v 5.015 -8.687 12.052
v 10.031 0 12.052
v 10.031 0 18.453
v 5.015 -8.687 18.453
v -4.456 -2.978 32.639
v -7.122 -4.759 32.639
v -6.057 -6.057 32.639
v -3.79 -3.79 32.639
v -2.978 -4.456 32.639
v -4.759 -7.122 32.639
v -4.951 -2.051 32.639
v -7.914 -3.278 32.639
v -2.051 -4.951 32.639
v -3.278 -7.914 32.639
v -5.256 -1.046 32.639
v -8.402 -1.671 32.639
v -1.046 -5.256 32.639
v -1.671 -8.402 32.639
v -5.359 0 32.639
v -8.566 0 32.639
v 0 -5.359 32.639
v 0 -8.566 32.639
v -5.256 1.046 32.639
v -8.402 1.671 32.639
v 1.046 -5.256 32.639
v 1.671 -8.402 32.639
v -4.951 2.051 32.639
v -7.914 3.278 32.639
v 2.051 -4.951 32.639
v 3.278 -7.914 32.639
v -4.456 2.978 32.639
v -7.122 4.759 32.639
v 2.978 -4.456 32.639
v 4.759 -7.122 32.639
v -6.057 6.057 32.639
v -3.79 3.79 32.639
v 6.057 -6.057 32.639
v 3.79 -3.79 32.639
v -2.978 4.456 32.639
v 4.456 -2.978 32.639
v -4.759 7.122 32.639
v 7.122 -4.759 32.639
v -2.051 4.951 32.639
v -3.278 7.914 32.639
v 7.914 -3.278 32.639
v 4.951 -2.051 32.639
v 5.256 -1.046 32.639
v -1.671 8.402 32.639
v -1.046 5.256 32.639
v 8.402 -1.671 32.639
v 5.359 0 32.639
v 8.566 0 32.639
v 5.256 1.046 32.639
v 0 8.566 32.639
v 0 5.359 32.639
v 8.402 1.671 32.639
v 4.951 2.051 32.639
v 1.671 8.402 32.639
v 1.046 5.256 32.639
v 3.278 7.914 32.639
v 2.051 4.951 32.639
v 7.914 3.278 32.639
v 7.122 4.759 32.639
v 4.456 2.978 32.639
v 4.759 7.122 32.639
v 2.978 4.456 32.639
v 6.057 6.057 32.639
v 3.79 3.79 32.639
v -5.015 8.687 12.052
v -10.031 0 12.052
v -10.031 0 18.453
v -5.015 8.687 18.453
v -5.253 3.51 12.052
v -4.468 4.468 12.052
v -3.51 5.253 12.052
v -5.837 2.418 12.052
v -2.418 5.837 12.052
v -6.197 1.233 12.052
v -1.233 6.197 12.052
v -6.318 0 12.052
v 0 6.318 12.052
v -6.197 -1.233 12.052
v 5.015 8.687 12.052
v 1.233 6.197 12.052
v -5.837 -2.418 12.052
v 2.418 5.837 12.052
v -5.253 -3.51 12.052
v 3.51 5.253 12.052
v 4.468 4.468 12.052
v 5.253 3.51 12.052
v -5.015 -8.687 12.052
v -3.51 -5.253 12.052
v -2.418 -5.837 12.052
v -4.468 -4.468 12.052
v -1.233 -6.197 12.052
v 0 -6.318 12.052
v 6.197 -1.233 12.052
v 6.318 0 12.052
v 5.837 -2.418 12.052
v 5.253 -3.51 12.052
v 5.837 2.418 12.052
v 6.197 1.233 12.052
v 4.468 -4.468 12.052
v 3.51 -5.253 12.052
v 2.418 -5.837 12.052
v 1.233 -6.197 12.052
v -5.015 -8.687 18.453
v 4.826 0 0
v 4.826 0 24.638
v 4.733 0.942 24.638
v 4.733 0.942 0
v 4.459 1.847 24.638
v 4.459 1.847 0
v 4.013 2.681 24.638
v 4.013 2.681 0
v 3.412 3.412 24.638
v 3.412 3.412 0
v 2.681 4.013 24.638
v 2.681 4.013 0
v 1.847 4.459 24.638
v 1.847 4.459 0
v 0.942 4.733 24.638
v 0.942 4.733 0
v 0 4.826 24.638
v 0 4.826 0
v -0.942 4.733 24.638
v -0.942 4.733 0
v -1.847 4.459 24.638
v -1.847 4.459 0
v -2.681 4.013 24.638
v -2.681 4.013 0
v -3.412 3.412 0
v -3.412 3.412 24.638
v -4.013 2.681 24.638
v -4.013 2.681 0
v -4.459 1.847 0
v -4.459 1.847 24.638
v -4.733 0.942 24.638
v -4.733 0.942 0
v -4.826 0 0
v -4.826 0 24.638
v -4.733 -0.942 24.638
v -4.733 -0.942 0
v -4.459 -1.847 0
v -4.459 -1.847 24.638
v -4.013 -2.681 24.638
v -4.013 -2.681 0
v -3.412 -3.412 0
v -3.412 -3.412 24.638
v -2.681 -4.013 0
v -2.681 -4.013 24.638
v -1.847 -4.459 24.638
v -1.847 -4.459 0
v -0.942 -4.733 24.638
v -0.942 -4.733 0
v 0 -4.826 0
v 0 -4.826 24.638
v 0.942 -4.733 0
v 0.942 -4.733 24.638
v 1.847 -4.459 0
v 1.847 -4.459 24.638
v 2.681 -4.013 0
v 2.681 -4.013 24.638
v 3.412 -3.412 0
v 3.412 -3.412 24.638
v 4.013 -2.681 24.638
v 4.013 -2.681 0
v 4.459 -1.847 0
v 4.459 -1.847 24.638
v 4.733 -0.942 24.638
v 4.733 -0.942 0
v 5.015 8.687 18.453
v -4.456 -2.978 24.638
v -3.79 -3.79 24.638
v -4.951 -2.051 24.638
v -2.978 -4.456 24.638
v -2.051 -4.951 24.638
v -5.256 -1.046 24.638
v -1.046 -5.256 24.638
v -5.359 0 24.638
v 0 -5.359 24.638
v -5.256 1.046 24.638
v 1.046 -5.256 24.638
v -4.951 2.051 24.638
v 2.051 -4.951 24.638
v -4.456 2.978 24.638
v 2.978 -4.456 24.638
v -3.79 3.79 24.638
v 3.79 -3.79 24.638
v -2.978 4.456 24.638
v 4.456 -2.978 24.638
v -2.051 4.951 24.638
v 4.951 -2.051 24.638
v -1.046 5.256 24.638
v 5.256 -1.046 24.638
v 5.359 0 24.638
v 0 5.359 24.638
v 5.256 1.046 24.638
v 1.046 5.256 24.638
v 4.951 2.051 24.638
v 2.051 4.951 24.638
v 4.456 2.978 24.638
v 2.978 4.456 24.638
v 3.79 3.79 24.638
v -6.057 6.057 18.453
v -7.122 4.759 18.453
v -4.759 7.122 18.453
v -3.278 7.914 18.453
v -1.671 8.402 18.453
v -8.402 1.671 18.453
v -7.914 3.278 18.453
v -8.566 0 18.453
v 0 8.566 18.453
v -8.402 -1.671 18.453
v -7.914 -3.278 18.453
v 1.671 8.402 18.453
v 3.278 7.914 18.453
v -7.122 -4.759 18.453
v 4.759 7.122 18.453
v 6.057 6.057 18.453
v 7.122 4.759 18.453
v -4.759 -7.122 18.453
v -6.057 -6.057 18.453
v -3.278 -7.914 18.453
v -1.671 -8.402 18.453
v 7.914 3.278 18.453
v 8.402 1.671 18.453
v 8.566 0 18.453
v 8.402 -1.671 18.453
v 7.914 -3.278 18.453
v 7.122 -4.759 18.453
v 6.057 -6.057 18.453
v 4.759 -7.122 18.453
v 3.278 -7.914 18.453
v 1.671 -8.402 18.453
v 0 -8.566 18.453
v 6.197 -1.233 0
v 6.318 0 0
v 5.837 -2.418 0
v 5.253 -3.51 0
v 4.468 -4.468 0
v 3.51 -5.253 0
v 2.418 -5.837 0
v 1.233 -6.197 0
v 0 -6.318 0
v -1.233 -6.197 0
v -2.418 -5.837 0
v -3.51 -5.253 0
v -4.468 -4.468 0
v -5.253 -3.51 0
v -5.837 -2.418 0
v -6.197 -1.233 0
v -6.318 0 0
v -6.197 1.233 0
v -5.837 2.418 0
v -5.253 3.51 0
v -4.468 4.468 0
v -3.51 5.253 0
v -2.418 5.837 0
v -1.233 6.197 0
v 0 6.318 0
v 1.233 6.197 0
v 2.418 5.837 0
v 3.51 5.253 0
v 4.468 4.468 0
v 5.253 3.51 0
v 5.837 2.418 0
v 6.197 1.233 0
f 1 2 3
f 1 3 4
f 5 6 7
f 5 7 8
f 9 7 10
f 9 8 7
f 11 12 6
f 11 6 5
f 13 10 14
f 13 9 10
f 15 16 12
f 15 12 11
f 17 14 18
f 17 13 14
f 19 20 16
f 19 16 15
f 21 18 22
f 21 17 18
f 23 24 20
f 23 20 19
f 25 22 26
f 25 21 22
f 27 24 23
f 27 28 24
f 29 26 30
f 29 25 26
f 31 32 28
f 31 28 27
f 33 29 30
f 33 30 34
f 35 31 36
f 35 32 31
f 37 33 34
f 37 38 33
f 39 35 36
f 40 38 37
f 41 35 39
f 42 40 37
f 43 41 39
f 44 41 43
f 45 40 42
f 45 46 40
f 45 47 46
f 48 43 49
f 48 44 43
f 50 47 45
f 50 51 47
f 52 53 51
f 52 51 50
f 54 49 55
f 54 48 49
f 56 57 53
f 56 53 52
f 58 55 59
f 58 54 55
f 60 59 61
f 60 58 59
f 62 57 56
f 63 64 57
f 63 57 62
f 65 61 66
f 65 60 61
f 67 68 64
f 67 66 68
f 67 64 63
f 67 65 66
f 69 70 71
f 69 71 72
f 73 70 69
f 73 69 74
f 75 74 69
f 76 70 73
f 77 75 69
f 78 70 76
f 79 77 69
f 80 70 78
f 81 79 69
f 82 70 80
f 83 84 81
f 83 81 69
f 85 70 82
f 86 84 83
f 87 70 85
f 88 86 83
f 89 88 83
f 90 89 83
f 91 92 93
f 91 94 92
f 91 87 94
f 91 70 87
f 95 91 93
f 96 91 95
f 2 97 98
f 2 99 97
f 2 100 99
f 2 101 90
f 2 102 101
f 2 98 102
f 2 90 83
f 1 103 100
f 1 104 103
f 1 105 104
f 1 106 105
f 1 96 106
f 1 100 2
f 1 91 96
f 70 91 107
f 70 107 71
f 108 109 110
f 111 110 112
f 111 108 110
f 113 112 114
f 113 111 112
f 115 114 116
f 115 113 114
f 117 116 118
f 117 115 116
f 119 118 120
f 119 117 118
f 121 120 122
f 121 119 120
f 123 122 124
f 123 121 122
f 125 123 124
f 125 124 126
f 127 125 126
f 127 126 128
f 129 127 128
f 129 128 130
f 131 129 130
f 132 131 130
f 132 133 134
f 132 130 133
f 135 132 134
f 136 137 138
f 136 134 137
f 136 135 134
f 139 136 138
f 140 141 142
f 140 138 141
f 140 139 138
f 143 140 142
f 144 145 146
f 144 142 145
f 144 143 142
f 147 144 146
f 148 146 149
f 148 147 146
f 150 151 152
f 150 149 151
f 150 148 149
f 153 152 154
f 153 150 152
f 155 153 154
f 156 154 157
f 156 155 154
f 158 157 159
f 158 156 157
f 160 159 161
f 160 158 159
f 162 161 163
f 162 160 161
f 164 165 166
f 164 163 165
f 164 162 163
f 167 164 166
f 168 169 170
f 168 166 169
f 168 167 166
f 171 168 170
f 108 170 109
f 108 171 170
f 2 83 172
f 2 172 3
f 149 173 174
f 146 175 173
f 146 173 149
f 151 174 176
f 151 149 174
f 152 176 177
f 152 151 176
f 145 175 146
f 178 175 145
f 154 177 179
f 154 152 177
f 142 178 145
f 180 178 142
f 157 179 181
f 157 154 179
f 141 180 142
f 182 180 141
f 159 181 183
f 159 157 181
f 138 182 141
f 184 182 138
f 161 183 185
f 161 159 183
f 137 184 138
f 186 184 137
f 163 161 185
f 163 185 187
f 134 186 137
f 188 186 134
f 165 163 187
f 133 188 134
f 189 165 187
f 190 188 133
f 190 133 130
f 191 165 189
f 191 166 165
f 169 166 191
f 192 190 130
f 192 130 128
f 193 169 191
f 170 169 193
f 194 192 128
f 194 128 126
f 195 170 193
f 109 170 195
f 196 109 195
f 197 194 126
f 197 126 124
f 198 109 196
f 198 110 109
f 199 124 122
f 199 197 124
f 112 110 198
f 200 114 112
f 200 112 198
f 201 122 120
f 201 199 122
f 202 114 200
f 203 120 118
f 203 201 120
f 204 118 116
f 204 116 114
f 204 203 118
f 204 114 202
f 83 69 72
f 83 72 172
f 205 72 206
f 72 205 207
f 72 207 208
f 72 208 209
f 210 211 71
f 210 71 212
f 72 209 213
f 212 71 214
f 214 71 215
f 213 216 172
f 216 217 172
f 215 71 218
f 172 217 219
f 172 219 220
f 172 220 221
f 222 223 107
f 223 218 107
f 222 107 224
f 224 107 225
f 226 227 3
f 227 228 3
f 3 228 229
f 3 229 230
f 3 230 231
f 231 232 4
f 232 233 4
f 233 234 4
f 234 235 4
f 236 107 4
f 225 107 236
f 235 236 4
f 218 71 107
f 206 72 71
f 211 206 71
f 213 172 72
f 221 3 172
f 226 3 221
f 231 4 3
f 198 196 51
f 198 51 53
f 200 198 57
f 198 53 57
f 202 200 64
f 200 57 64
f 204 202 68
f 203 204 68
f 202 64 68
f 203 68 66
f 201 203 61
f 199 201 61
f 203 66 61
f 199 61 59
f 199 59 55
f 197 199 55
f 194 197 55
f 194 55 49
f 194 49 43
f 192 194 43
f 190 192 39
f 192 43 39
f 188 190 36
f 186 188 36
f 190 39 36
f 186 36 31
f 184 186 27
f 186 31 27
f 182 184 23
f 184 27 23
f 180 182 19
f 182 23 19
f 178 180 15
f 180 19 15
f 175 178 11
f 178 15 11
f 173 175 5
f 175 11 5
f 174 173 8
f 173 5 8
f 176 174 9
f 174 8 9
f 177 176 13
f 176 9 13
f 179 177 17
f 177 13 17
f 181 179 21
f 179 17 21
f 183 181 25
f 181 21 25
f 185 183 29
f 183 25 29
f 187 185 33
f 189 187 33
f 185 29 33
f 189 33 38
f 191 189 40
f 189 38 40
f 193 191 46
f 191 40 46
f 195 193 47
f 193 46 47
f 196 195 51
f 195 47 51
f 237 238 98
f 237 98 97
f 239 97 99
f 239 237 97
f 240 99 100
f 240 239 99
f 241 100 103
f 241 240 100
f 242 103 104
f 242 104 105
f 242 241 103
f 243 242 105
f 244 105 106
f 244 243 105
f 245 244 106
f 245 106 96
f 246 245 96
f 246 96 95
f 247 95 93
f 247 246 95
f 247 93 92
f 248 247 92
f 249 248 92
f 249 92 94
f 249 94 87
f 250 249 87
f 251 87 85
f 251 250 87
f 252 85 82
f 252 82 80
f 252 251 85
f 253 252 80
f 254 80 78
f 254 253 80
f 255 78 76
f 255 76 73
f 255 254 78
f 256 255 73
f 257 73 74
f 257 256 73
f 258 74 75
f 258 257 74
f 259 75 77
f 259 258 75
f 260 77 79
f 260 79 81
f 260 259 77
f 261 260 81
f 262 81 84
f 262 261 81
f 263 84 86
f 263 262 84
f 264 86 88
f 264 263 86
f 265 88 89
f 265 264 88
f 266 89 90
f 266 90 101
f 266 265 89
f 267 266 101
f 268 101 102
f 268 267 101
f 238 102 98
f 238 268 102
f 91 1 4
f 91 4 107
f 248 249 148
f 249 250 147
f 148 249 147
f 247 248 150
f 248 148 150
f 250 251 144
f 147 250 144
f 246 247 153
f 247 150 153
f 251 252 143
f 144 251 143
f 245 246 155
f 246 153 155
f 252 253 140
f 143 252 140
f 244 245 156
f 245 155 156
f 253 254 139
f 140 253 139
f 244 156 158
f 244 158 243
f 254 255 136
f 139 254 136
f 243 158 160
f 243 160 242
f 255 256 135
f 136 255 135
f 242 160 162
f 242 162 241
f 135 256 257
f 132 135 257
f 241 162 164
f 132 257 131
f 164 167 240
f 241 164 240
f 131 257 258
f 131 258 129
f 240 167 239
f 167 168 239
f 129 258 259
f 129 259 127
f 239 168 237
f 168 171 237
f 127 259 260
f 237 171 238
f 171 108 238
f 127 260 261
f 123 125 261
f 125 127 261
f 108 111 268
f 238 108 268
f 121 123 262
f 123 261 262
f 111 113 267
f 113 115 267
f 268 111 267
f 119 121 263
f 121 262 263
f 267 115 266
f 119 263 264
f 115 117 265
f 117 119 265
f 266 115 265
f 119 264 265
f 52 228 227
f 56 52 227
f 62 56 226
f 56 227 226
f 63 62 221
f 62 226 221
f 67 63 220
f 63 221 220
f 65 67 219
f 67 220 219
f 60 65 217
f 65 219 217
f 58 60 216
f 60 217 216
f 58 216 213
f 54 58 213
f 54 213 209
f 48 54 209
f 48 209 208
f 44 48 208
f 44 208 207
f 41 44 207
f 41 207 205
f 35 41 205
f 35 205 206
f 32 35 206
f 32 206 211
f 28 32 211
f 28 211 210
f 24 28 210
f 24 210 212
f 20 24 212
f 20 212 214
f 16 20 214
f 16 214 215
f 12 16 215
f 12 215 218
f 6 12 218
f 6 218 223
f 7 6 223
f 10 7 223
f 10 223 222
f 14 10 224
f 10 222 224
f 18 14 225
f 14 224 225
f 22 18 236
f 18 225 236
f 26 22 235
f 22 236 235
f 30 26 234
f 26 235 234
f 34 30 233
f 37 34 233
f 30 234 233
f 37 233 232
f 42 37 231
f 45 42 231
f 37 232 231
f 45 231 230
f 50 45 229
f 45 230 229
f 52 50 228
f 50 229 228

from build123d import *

# Parameters (mm, degrees)
F0_R     = 8.56615
F0_R_2   = 4.826
F1_DEPTH = 32.639
F2_R     = 16.123206
F2_R_2   = 6.31825
F3_DEPTH = 12.0523
F4_R     = 4.826
F5_DEPTH = 6.4008
F6_R     = 5.3594
F7_DEPTH = 8.001


with BuildPart() as f1:
    # F0 (on Top) → F1 (new body)
    with BuildSketch(Plane.XY):
        Circle(F0_R)
        Circle(F0_R_2, mode=Mode.SUBTRACT)
    extrude(amount=F1_DEPTH)

    # F2 (on face) → F3 (cut)
    with BuildSketch(Plane(origin=(0, 0, 0), x_dir=(1, 0, 0), z_dir=(0, 0, -1))):
        Circle(F2_R)
        Circle(F2_R_2, mode=Mode.SUBTRACT)
    extrude(amount=-F3_DEPTH, mode=Mode.SUBTRACT)

    # F4 (on face) → F5 (join)
    with BuildSketch(Plane(origin=(0, 0, 12.0523), x_dir=(1, 0, 0), z_dir=(0, 0, -1))):
        Polygon((5.015326, 8.6868), (-5.015326, 8.6868), (-10.030653, 0), (-5.015326, -8.6868), (5.015326, -8.6868), (10.030653, 0), align=None)
        Circle(F4_R, mode=Mode.SUBTRACT)
    extrude(amount=-F5_DEPTH)

    # F6 (on face) → F7 (cut)
    with BuildSketch(Plane.XY.offset(32.639)):
        Circle(F6_R)
    extrude(amount=-F7_DEPTH, mode=Mode.SUBTRACT)


solid = f1.part
